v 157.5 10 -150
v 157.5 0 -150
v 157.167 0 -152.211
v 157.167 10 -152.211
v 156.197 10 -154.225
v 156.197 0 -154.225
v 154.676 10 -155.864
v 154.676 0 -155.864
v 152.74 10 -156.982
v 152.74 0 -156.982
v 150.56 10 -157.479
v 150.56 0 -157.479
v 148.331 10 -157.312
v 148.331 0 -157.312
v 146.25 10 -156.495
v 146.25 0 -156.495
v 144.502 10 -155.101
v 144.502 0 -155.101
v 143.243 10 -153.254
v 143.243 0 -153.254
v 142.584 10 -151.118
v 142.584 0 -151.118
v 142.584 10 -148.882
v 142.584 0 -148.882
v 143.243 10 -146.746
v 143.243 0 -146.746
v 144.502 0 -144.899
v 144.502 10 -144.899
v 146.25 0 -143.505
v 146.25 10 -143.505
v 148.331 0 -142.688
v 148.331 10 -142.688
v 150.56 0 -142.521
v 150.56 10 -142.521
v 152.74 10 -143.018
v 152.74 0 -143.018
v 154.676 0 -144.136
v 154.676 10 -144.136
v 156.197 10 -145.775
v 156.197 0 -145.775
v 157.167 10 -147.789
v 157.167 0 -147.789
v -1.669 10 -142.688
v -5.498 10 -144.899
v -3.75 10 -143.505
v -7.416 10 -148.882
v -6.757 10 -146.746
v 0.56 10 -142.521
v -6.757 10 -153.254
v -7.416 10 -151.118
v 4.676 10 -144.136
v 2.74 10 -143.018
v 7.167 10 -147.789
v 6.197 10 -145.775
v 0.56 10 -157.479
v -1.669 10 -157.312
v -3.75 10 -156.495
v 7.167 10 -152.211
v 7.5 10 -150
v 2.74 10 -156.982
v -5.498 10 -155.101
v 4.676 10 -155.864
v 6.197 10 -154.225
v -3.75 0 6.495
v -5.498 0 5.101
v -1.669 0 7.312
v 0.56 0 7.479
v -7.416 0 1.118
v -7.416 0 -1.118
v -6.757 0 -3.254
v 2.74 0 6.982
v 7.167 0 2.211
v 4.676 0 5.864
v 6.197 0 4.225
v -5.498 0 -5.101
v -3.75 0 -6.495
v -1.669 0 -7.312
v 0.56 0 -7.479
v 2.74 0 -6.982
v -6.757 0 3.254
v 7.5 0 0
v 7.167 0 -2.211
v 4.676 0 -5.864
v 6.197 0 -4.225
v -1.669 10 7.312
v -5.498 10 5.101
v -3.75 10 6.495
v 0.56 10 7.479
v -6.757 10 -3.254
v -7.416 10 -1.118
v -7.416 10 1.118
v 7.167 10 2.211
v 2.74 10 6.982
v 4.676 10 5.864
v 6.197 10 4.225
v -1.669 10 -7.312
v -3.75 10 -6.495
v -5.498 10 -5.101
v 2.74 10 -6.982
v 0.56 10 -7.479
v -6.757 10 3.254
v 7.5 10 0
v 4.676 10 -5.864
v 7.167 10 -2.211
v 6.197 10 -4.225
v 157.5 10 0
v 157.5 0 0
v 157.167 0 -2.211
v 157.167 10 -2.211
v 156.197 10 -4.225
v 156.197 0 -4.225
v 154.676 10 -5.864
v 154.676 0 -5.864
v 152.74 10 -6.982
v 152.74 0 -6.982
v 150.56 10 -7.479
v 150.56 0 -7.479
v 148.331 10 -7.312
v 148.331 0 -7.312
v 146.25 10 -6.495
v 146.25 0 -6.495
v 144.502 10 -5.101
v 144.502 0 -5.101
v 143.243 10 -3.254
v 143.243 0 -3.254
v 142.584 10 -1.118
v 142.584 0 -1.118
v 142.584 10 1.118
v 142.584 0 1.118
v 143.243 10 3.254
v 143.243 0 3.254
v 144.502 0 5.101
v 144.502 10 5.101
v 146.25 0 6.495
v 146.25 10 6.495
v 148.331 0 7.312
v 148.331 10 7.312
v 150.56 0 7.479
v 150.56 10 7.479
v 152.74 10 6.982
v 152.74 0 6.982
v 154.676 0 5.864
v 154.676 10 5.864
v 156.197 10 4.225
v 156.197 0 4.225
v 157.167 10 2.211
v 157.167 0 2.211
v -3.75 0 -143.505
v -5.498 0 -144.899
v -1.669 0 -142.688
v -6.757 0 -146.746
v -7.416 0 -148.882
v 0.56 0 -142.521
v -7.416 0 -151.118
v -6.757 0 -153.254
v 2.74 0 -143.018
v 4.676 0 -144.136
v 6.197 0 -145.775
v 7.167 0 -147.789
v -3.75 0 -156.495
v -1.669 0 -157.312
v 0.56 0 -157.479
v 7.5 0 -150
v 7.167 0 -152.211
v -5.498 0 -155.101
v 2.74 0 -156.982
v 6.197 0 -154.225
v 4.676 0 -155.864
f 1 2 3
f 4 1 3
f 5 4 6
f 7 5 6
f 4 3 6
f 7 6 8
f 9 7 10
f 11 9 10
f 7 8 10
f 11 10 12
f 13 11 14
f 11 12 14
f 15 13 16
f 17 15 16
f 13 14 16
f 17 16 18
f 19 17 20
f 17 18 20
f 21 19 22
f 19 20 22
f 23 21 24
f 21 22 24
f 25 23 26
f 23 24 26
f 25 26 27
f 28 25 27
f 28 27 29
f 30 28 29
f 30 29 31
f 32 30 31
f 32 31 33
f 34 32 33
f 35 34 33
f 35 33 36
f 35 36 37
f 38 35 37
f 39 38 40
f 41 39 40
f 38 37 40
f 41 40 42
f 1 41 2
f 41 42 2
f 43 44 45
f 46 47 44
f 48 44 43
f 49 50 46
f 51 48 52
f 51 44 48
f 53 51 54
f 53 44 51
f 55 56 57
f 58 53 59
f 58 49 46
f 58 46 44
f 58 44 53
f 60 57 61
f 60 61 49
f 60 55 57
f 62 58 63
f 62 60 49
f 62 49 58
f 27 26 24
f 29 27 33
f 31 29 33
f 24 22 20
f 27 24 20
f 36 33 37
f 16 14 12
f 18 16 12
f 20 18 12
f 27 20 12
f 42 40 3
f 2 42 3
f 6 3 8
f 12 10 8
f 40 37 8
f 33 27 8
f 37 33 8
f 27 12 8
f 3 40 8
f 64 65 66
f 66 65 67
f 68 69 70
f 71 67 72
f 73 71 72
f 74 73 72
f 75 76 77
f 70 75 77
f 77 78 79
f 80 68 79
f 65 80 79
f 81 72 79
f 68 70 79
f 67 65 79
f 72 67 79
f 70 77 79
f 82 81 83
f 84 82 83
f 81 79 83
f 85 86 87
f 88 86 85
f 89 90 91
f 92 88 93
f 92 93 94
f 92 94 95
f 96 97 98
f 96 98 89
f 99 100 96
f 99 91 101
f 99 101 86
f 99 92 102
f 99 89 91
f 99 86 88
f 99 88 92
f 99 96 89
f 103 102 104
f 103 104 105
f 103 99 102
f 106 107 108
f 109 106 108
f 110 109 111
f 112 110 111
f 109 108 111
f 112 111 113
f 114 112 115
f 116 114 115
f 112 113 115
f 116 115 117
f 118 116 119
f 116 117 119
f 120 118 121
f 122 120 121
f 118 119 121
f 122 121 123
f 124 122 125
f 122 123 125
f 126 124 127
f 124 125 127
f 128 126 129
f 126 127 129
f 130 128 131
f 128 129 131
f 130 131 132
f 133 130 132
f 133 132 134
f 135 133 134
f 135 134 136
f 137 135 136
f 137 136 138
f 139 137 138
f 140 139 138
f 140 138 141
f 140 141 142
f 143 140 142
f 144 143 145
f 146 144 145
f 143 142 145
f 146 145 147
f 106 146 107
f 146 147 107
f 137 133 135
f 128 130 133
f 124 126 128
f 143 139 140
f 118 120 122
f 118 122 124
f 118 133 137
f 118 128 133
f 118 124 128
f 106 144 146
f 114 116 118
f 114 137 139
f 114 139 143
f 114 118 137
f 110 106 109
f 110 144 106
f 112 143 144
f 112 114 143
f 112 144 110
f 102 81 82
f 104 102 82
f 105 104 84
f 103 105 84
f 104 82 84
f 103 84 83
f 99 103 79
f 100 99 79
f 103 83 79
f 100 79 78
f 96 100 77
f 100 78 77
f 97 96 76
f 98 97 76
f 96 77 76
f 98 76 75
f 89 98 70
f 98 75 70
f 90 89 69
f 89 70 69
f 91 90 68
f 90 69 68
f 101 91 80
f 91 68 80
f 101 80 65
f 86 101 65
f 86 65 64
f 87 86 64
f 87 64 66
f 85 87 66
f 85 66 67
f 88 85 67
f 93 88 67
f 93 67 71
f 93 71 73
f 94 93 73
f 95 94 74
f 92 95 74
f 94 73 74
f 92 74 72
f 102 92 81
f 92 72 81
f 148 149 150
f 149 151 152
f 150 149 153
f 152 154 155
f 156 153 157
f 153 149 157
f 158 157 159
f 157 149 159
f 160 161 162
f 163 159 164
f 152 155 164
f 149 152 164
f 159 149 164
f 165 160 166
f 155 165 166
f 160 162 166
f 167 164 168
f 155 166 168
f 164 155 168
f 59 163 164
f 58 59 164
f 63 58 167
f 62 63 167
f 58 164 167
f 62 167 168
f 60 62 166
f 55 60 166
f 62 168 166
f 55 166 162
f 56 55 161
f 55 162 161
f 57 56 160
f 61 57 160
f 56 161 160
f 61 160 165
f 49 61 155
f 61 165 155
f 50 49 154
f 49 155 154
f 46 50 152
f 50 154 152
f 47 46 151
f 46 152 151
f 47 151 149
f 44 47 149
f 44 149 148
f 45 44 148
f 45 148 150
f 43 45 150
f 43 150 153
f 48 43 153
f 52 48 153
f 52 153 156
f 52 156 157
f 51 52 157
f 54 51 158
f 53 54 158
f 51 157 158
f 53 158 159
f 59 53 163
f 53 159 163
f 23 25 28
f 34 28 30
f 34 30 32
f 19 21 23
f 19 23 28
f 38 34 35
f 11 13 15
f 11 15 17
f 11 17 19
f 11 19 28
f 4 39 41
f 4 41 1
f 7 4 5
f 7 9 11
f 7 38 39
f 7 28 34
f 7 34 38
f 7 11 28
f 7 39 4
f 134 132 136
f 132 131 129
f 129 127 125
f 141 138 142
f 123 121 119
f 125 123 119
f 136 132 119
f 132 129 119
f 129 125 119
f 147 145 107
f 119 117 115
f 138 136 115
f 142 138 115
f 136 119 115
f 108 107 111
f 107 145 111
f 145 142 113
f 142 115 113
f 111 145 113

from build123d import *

# Parameters (mm, degrees)
SKETCH1_R             = 7.5
BOSS_EXTRUDE1_DEPTH   = 10
BOSS_EXTRUDE1_2_DEPTH = 10
BOSS_EXTRUDE1_3_DEPTH = 10
BOSS_EXTRUDE1_4_DEPTH = 10


with BuildPart() as part:
    # Sketch1 → Boss-Extrude1 (new body)
    with BuildSketch(Plane(origin=(0, 0, 0), x_dir=(1, 0, 0), z_dir=(0, 1, 0))):
        with Locations((0, 150)):
            Circle(SKETCH1_R)
    extrude(amount=BOSS_EXTRUDE1_DEPTH)


with BuildPart() as body_2:
    # Sketch1 → Boss-Extrude1 2 (new body)
    with BuildSketch(Plane(origin=(0, 0, 0), x_dir=(1, 0, 0), z_dir=(0, 1, 0))):
        with Locations((150, 150)):
            Circle(SKETCH1_R)
    extrude(amount=BOSS_EXTRUDE1_2_DEPTH)


with BuildPart() as body_3:
    # Sketch1 → Boss-Extrude1 3 (new body)
    with BuildSketch(Plane(origin=(0, 0, 0), x_dir=(1, 0, 0), z_dir=(0, 1, 0))):
        with Locations((150, 0)):
            Circle(SKETCH1_R)
    extrude(amount=BOSS_EXTRUDE1_3_DEPTH)


with BuildPart() as body_4:
    # Sketch1 → Boss-Extrude1 4 (new body)
    with BuildSketch(Plane(origin=(0, 0, 0), x_dir=(1, 0, 0), z_dir=(0, 1, 0))):
        Circle(SKETCH1_R)
    extrude(amount=BOSS_EXTRUDE1_4_DEPTH)


solid = Compound([part.part, body_2.part, body_3.part, body_4.part])
